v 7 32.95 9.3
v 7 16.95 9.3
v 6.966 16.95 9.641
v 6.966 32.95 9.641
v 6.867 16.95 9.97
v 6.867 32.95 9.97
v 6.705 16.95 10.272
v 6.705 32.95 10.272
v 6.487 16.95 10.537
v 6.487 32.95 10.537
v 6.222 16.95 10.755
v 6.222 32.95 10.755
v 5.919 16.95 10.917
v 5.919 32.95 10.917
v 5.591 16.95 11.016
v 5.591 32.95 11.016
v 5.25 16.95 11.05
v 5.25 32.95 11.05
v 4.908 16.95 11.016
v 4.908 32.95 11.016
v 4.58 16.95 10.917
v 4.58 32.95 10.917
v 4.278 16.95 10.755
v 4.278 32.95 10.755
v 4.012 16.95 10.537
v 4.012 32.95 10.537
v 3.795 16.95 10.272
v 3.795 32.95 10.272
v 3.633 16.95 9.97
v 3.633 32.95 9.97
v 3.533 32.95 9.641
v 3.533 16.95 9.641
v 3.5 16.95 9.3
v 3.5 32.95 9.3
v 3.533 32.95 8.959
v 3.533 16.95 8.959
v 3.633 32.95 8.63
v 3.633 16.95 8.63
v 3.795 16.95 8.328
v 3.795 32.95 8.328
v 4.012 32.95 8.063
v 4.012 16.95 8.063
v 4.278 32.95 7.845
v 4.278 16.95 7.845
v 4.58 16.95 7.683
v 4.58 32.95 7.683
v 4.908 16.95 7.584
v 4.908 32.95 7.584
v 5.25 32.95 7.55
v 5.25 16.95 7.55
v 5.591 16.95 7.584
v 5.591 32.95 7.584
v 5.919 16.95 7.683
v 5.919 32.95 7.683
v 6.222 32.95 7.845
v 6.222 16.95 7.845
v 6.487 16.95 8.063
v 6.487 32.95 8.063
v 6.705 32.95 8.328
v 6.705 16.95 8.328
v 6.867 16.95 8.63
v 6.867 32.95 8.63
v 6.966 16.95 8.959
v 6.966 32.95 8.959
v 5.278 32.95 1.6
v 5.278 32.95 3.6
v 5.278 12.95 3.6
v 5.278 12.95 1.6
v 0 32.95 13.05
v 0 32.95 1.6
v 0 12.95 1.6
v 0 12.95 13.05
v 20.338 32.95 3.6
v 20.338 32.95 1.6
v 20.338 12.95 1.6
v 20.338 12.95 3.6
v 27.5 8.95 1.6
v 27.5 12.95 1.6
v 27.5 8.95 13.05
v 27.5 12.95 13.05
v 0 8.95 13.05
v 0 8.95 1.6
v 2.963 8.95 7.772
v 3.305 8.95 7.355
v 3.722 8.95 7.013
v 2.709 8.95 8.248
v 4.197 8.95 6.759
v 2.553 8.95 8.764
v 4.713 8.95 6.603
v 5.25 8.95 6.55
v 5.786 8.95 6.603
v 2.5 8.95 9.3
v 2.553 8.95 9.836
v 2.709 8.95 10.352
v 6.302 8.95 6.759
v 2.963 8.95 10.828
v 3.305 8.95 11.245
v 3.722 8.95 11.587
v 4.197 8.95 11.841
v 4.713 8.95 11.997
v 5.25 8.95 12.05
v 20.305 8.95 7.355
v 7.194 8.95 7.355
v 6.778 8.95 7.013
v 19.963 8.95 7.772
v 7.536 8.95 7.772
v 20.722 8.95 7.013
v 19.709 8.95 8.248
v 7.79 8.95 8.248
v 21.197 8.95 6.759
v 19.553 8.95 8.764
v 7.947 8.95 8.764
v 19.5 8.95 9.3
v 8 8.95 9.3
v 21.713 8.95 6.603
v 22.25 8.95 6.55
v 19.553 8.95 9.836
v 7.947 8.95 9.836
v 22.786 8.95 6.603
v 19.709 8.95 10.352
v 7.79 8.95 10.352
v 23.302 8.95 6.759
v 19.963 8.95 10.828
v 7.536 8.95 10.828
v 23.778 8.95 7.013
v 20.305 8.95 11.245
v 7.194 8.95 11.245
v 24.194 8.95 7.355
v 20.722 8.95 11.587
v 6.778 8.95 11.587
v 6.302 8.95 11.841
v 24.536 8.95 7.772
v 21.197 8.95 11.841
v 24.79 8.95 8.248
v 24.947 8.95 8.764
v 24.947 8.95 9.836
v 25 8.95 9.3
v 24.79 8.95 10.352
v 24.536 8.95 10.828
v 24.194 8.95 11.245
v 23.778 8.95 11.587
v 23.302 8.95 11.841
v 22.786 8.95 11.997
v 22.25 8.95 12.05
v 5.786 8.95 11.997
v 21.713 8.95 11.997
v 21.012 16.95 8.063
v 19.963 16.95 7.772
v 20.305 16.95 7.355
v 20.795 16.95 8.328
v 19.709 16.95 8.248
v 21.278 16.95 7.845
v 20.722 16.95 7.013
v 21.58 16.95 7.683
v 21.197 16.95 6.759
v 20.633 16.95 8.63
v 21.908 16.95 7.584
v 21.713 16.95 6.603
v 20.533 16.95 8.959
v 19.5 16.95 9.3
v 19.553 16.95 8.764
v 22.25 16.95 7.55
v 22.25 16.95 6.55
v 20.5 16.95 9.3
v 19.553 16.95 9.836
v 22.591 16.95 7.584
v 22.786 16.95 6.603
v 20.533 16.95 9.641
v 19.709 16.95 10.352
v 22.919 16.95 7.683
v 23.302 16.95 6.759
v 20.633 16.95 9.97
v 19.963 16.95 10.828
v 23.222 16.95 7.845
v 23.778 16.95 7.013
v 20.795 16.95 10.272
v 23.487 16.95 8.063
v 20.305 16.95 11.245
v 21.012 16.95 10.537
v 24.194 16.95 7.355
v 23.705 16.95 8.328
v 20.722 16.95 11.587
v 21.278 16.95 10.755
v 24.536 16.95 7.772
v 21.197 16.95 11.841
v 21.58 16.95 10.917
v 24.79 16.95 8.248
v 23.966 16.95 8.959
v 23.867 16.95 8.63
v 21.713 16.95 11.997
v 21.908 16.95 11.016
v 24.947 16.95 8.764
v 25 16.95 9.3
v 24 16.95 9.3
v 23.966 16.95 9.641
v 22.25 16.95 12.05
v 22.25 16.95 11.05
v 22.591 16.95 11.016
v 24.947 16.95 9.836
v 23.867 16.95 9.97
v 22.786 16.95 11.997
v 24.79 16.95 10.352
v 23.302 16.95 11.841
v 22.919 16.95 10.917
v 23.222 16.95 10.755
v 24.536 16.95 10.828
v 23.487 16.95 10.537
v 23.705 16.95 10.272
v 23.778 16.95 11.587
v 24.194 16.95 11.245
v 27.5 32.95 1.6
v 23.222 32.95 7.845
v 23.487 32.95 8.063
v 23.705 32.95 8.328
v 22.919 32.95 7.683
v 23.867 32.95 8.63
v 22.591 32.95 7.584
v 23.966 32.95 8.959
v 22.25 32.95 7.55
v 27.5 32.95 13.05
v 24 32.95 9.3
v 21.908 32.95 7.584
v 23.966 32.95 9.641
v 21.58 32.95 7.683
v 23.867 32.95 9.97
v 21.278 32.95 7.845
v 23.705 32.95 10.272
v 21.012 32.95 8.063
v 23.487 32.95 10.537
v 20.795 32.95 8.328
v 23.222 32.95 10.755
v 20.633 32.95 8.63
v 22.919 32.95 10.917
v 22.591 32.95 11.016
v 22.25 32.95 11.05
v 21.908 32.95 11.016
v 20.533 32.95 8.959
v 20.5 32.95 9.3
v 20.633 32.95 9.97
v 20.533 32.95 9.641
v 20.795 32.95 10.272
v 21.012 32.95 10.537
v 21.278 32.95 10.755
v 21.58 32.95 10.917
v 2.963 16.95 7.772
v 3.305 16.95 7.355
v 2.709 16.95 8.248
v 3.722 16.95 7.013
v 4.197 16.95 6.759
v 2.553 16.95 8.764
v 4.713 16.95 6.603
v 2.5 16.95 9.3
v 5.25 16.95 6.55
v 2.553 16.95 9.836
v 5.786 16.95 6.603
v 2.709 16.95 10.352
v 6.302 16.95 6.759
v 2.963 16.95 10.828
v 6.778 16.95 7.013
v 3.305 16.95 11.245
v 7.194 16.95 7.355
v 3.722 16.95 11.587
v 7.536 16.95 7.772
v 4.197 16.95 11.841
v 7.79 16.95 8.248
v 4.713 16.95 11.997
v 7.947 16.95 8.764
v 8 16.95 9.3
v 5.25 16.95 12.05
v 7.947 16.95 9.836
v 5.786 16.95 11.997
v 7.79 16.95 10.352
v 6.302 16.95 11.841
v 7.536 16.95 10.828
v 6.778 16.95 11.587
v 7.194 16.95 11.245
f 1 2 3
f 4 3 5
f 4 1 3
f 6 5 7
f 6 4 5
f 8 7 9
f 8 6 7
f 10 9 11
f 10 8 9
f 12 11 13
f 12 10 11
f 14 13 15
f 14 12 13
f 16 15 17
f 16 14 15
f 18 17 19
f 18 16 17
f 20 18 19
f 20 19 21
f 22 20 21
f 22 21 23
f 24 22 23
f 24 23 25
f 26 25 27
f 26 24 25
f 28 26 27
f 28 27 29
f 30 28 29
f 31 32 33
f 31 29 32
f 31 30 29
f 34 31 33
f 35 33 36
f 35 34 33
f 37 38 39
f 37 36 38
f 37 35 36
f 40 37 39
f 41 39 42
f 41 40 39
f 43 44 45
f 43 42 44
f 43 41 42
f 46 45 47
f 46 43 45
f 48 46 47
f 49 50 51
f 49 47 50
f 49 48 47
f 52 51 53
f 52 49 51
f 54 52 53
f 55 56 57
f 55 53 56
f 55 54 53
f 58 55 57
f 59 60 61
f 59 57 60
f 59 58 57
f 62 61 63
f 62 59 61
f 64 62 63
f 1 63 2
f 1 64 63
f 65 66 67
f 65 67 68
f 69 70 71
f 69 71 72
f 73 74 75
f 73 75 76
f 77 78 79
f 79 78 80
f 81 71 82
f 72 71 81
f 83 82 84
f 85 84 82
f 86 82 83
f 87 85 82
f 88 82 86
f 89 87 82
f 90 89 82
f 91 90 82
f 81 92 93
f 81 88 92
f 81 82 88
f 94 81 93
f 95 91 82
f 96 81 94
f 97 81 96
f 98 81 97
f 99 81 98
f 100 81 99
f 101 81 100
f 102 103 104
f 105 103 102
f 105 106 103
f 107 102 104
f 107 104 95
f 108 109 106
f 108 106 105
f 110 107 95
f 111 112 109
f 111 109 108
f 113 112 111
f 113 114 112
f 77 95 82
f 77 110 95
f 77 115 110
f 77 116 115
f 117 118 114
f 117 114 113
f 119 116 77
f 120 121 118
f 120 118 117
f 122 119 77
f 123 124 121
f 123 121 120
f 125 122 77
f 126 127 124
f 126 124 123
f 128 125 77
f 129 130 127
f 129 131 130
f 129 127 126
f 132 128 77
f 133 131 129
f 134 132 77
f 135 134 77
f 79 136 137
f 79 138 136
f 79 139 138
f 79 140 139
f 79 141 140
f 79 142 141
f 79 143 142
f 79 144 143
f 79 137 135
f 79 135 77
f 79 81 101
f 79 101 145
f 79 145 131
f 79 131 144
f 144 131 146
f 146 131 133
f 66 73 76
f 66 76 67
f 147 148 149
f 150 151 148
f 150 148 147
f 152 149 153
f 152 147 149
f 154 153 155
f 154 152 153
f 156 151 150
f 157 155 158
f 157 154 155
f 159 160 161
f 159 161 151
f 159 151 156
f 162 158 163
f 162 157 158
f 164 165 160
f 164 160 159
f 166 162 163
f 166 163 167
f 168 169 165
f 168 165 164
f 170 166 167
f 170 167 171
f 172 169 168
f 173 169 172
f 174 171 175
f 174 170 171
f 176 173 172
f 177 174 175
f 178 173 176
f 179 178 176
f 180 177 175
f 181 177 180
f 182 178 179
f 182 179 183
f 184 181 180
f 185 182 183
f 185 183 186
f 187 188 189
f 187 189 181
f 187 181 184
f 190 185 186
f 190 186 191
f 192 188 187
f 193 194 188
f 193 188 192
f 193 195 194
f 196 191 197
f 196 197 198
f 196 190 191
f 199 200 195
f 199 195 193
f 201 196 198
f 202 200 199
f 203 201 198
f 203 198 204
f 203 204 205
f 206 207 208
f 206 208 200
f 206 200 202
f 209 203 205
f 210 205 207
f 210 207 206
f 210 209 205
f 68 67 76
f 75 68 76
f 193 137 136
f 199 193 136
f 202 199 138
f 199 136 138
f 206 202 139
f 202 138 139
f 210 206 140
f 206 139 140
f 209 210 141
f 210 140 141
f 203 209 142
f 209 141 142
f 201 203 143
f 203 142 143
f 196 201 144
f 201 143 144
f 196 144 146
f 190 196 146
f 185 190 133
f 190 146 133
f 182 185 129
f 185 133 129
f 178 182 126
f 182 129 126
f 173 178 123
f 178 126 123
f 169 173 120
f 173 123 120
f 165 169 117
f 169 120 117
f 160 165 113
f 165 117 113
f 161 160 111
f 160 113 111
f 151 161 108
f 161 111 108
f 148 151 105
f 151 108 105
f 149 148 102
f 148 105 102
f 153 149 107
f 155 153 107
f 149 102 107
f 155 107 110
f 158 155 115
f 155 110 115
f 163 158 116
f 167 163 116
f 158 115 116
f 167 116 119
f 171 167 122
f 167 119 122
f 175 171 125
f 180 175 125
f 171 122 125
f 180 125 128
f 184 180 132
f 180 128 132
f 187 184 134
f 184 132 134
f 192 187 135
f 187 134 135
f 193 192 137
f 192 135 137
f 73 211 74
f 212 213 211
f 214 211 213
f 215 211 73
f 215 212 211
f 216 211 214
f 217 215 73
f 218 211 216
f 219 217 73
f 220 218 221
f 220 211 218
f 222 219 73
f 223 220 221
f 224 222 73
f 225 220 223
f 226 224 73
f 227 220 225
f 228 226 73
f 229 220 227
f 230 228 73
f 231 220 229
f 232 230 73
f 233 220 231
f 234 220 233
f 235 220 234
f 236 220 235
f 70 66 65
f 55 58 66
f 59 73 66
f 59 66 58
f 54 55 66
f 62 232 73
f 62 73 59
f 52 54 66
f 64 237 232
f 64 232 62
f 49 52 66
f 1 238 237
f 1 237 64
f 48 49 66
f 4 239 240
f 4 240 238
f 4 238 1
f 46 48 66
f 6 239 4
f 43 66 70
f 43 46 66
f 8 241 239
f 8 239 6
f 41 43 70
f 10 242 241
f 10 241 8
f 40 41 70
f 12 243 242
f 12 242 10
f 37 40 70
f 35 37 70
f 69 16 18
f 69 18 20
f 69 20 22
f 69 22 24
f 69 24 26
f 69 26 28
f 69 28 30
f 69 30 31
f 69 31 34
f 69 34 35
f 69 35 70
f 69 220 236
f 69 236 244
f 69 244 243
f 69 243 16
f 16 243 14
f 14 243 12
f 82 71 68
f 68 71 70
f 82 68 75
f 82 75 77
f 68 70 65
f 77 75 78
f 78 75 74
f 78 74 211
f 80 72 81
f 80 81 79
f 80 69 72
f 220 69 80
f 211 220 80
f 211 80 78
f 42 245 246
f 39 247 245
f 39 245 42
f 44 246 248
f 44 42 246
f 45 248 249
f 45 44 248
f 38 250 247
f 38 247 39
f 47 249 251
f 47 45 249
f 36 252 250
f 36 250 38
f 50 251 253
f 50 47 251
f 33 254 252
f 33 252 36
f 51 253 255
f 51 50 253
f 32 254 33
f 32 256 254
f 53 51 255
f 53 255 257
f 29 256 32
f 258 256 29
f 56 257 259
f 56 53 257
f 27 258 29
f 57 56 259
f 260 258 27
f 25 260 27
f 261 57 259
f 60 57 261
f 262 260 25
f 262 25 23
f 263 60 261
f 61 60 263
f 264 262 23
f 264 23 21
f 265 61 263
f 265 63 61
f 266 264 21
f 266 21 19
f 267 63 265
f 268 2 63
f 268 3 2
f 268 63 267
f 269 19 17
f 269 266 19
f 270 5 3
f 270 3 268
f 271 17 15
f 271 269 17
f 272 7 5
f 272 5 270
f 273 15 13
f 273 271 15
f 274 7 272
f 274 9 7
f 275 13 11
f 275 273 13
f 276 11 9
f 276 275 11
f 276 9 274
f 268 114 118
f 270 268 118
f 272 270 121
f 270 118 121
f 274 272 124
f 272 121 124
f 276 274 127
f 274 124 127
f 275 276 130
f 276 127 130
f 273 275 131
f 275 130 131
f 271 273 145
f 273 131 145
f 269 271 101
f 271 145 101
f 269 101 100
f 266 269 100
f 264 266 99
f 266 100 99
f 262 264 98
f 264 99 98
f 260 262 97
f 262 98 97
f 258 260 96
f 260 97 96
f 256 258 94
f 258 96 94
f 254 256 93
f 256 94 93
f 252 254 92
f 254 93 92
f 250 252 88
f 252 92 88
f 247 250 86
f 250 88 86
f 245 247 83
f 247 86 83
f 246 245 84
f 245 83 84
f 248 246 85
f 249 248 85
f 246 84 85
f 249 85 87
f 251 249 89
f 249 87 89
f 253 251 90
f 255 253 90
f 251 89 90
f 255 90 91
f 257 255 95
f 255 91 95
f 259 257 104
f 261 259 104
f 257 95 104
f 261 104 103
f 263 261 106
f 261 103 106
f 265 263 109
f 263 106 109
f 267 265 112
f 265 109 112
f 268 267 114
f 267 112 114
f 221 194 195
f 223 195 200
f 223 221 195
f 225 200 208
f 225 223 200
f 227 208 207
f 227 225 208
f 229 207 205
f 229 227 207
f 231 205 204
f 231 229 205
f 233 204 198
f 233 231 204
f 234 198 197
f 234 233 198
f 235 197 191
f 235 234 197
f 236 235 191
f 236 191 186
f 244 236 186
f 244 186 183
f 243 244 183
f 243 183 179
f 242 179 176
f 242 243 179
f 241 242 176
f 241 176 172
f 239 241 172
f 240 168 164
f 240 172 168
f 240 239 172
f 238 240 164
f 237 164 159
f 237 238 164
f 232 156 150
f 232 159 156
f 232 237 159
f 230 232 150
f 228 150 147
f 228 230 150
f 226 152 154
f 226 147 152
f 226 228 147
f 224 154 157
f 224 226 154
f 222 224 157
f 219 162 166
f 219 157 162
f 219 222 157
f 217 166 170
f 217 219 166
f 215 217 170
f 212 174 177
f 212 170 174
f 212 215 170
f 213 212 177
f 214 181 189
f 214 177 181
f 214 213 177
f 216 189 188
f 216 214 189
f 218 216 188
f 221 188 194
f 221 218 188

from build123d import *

# Parameters (mm, degrees)
SKETCH018_R     = 1.75
PAD009_DEPTH    = 20
SKETCH019_W     = 27.500439
SKETCH019_H     = 11.45
SKETCH019_R     = 1.75
PAD010_DEPTH    = 4
SKETCH020_R     = 2.75
POCKET009_DEPTH = 8


with BuildPart() as part:
    # Sketch018 (on Face27 of Binder005) → Pad009 (new body)
    with BuildSketch(Plane.XZ.offset(-32.95)):
        Polygon((-0.000439, 13.05), (27.5, 13.05), (27.5, 1.6), (20.338297, 1.6), (20.338297, 3.6), (5.278297, 3.6), (5.278297, 1.6), (-0.000439, 1.6), align=None)
        with Locations((5.24978, 9.3)):
            Circle(SKETCH018_R, mode=Mode.SUBTRACT)
        with Locations((22.24978, 9.3)):
            Circle(SKETCH018_R, mode=Mode.SUBTRACT)
    extrude(amount=PAD009_DEPTH)

    # Sketch019 (on Face12 of Pad009) → Pad010 (join)
    with BuildSketch(Plane.XZ.offset(-12.95)):
        with Locations((13.74978, 7.325)):
            Rectangle(SKETCH019_W, SKETCH019_H)
        with Locations((5.24978, 9.3)):
            Circle(SKETCH019_R, mode=Mode.SUBTRACT)
        with Locations((22.24978, 9.3)):
            Circle(SKETCH019_R, mode=Mode.SUBTRACT)
    extrude(amount=PAD010_DEPTH)

    # Sketch020 (on Face1 of Pad010) → Pocket009 (cut)
    with BuildSketch(Plane.XZ.offset(-8.95)):
        with Locations((22.24978, 9.3)):
            Circle(SKETCH020_R)
        with Locations((5.24978, 9.3)):
            Circle(SKETCH020_R)
    extrude(amount=-POCKET009_DEPTH, mode=Mode.SUBTRACT)


solid = part.part
